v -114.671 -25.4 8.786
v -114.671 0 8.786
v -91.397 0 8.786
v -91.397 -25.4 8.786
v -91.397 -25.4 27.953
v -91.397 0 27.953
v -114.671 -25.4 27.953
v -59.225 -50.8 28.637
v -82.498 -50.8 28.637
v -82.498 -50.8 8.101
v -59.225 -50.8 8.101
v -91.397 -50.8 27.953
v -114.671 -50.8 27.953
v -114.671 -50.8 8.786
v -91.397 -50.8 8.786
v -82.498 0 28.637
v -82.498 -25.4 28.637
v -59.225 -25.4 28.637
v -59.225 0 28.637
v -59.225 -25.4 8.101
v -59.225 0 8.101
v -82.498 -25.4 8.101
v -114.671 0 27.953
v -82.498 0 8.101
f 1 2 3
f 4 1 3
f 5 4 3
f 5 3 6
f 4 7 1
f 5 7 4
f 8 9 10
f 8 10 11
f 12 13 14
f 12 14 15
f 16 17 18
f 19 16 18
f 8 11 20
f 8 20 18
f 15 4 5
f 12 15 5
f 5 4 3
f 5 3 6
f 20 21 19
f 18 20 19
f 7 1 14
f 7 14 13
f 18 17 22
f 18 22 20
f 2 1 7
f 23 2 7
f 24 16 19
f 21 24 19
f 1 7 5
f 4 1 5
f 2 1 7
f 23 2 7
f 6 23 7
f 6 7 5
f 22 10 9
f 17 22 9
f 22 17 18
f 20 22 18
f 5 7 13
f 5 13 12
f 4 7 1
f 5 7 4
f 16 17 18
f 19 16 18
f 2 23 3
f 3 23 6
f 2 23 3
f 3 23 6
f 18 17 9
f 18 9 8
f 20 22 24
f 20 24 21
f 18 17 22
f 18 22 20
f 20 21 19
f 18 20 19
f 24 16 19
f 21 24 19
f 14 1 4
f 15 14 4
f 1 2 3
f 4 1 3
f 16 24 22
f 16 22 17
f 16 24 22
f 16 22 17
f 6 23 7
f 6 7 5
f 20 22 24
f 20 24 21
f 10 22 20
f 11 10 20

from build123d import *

# Parameters (mm, degrees)
F5_W        = 23.273744
F5_H        = 20.53564
F4_W        = 23.273721
F4_H        = 19.166596
F7_DEPTH    = 25.4
F8_DEPTH    = 25.4
F7_FACE_W   = 23.273722
F7_FACE_H   = 19.166596
F7_FACE_W_2 = 23.273743
F7_FACE_H_2 = 20.53564
F9_DEPTH    = 25.4


with BuildPart() as f7:
    # F5 (on Front) + F4 (on Front) → F7 (new body)
    with BuildSketch(Plane.XZ):
        with Locations((-70.861414, 18.369235)):
            Rectangle(F5_W, F5_H)
    with BuildSketch(Plane.XZ):
        with Locations((-103.033907, 18.369235)):
            Rectangle(F4_W, F4_H)
    extrude(amount=F7_DEPTH)


with BuildPart() as f8:
    # F4 (on Front) + F5 (on Front) → F8 (new body)
    with BuildSketch(Plane.XZ):
        with Locations((-103.033907, 18.369235)):
            Rectangle(F4_W, F4_H)
    with BuildSketch(Plane.XZ):
        with Locations((-70.861414, 18.369235)):
            Rectangle(F5_W, F5_H)
    extrude(amount=F8_DEPTH)


with BuildPart() as f9:
    # F7_face (on face) → F9 (new body)
    with BuildSketch(Plane(origin=(-103.033908, -25.4, 18.369235), x_dir=(1, 0, 0), z_dir=(0, -1, 0))):
        Rectangle(F7_FACE_W, F7_FACE_H)
        with Locations((32.172494, 0)):
            Rectangle(F7_FACE_W_2, F7_FACE_H_2)
    extrude(amount=F9_DEPTH)


solid = Compound([f7.part, f8.part, f9.part])
